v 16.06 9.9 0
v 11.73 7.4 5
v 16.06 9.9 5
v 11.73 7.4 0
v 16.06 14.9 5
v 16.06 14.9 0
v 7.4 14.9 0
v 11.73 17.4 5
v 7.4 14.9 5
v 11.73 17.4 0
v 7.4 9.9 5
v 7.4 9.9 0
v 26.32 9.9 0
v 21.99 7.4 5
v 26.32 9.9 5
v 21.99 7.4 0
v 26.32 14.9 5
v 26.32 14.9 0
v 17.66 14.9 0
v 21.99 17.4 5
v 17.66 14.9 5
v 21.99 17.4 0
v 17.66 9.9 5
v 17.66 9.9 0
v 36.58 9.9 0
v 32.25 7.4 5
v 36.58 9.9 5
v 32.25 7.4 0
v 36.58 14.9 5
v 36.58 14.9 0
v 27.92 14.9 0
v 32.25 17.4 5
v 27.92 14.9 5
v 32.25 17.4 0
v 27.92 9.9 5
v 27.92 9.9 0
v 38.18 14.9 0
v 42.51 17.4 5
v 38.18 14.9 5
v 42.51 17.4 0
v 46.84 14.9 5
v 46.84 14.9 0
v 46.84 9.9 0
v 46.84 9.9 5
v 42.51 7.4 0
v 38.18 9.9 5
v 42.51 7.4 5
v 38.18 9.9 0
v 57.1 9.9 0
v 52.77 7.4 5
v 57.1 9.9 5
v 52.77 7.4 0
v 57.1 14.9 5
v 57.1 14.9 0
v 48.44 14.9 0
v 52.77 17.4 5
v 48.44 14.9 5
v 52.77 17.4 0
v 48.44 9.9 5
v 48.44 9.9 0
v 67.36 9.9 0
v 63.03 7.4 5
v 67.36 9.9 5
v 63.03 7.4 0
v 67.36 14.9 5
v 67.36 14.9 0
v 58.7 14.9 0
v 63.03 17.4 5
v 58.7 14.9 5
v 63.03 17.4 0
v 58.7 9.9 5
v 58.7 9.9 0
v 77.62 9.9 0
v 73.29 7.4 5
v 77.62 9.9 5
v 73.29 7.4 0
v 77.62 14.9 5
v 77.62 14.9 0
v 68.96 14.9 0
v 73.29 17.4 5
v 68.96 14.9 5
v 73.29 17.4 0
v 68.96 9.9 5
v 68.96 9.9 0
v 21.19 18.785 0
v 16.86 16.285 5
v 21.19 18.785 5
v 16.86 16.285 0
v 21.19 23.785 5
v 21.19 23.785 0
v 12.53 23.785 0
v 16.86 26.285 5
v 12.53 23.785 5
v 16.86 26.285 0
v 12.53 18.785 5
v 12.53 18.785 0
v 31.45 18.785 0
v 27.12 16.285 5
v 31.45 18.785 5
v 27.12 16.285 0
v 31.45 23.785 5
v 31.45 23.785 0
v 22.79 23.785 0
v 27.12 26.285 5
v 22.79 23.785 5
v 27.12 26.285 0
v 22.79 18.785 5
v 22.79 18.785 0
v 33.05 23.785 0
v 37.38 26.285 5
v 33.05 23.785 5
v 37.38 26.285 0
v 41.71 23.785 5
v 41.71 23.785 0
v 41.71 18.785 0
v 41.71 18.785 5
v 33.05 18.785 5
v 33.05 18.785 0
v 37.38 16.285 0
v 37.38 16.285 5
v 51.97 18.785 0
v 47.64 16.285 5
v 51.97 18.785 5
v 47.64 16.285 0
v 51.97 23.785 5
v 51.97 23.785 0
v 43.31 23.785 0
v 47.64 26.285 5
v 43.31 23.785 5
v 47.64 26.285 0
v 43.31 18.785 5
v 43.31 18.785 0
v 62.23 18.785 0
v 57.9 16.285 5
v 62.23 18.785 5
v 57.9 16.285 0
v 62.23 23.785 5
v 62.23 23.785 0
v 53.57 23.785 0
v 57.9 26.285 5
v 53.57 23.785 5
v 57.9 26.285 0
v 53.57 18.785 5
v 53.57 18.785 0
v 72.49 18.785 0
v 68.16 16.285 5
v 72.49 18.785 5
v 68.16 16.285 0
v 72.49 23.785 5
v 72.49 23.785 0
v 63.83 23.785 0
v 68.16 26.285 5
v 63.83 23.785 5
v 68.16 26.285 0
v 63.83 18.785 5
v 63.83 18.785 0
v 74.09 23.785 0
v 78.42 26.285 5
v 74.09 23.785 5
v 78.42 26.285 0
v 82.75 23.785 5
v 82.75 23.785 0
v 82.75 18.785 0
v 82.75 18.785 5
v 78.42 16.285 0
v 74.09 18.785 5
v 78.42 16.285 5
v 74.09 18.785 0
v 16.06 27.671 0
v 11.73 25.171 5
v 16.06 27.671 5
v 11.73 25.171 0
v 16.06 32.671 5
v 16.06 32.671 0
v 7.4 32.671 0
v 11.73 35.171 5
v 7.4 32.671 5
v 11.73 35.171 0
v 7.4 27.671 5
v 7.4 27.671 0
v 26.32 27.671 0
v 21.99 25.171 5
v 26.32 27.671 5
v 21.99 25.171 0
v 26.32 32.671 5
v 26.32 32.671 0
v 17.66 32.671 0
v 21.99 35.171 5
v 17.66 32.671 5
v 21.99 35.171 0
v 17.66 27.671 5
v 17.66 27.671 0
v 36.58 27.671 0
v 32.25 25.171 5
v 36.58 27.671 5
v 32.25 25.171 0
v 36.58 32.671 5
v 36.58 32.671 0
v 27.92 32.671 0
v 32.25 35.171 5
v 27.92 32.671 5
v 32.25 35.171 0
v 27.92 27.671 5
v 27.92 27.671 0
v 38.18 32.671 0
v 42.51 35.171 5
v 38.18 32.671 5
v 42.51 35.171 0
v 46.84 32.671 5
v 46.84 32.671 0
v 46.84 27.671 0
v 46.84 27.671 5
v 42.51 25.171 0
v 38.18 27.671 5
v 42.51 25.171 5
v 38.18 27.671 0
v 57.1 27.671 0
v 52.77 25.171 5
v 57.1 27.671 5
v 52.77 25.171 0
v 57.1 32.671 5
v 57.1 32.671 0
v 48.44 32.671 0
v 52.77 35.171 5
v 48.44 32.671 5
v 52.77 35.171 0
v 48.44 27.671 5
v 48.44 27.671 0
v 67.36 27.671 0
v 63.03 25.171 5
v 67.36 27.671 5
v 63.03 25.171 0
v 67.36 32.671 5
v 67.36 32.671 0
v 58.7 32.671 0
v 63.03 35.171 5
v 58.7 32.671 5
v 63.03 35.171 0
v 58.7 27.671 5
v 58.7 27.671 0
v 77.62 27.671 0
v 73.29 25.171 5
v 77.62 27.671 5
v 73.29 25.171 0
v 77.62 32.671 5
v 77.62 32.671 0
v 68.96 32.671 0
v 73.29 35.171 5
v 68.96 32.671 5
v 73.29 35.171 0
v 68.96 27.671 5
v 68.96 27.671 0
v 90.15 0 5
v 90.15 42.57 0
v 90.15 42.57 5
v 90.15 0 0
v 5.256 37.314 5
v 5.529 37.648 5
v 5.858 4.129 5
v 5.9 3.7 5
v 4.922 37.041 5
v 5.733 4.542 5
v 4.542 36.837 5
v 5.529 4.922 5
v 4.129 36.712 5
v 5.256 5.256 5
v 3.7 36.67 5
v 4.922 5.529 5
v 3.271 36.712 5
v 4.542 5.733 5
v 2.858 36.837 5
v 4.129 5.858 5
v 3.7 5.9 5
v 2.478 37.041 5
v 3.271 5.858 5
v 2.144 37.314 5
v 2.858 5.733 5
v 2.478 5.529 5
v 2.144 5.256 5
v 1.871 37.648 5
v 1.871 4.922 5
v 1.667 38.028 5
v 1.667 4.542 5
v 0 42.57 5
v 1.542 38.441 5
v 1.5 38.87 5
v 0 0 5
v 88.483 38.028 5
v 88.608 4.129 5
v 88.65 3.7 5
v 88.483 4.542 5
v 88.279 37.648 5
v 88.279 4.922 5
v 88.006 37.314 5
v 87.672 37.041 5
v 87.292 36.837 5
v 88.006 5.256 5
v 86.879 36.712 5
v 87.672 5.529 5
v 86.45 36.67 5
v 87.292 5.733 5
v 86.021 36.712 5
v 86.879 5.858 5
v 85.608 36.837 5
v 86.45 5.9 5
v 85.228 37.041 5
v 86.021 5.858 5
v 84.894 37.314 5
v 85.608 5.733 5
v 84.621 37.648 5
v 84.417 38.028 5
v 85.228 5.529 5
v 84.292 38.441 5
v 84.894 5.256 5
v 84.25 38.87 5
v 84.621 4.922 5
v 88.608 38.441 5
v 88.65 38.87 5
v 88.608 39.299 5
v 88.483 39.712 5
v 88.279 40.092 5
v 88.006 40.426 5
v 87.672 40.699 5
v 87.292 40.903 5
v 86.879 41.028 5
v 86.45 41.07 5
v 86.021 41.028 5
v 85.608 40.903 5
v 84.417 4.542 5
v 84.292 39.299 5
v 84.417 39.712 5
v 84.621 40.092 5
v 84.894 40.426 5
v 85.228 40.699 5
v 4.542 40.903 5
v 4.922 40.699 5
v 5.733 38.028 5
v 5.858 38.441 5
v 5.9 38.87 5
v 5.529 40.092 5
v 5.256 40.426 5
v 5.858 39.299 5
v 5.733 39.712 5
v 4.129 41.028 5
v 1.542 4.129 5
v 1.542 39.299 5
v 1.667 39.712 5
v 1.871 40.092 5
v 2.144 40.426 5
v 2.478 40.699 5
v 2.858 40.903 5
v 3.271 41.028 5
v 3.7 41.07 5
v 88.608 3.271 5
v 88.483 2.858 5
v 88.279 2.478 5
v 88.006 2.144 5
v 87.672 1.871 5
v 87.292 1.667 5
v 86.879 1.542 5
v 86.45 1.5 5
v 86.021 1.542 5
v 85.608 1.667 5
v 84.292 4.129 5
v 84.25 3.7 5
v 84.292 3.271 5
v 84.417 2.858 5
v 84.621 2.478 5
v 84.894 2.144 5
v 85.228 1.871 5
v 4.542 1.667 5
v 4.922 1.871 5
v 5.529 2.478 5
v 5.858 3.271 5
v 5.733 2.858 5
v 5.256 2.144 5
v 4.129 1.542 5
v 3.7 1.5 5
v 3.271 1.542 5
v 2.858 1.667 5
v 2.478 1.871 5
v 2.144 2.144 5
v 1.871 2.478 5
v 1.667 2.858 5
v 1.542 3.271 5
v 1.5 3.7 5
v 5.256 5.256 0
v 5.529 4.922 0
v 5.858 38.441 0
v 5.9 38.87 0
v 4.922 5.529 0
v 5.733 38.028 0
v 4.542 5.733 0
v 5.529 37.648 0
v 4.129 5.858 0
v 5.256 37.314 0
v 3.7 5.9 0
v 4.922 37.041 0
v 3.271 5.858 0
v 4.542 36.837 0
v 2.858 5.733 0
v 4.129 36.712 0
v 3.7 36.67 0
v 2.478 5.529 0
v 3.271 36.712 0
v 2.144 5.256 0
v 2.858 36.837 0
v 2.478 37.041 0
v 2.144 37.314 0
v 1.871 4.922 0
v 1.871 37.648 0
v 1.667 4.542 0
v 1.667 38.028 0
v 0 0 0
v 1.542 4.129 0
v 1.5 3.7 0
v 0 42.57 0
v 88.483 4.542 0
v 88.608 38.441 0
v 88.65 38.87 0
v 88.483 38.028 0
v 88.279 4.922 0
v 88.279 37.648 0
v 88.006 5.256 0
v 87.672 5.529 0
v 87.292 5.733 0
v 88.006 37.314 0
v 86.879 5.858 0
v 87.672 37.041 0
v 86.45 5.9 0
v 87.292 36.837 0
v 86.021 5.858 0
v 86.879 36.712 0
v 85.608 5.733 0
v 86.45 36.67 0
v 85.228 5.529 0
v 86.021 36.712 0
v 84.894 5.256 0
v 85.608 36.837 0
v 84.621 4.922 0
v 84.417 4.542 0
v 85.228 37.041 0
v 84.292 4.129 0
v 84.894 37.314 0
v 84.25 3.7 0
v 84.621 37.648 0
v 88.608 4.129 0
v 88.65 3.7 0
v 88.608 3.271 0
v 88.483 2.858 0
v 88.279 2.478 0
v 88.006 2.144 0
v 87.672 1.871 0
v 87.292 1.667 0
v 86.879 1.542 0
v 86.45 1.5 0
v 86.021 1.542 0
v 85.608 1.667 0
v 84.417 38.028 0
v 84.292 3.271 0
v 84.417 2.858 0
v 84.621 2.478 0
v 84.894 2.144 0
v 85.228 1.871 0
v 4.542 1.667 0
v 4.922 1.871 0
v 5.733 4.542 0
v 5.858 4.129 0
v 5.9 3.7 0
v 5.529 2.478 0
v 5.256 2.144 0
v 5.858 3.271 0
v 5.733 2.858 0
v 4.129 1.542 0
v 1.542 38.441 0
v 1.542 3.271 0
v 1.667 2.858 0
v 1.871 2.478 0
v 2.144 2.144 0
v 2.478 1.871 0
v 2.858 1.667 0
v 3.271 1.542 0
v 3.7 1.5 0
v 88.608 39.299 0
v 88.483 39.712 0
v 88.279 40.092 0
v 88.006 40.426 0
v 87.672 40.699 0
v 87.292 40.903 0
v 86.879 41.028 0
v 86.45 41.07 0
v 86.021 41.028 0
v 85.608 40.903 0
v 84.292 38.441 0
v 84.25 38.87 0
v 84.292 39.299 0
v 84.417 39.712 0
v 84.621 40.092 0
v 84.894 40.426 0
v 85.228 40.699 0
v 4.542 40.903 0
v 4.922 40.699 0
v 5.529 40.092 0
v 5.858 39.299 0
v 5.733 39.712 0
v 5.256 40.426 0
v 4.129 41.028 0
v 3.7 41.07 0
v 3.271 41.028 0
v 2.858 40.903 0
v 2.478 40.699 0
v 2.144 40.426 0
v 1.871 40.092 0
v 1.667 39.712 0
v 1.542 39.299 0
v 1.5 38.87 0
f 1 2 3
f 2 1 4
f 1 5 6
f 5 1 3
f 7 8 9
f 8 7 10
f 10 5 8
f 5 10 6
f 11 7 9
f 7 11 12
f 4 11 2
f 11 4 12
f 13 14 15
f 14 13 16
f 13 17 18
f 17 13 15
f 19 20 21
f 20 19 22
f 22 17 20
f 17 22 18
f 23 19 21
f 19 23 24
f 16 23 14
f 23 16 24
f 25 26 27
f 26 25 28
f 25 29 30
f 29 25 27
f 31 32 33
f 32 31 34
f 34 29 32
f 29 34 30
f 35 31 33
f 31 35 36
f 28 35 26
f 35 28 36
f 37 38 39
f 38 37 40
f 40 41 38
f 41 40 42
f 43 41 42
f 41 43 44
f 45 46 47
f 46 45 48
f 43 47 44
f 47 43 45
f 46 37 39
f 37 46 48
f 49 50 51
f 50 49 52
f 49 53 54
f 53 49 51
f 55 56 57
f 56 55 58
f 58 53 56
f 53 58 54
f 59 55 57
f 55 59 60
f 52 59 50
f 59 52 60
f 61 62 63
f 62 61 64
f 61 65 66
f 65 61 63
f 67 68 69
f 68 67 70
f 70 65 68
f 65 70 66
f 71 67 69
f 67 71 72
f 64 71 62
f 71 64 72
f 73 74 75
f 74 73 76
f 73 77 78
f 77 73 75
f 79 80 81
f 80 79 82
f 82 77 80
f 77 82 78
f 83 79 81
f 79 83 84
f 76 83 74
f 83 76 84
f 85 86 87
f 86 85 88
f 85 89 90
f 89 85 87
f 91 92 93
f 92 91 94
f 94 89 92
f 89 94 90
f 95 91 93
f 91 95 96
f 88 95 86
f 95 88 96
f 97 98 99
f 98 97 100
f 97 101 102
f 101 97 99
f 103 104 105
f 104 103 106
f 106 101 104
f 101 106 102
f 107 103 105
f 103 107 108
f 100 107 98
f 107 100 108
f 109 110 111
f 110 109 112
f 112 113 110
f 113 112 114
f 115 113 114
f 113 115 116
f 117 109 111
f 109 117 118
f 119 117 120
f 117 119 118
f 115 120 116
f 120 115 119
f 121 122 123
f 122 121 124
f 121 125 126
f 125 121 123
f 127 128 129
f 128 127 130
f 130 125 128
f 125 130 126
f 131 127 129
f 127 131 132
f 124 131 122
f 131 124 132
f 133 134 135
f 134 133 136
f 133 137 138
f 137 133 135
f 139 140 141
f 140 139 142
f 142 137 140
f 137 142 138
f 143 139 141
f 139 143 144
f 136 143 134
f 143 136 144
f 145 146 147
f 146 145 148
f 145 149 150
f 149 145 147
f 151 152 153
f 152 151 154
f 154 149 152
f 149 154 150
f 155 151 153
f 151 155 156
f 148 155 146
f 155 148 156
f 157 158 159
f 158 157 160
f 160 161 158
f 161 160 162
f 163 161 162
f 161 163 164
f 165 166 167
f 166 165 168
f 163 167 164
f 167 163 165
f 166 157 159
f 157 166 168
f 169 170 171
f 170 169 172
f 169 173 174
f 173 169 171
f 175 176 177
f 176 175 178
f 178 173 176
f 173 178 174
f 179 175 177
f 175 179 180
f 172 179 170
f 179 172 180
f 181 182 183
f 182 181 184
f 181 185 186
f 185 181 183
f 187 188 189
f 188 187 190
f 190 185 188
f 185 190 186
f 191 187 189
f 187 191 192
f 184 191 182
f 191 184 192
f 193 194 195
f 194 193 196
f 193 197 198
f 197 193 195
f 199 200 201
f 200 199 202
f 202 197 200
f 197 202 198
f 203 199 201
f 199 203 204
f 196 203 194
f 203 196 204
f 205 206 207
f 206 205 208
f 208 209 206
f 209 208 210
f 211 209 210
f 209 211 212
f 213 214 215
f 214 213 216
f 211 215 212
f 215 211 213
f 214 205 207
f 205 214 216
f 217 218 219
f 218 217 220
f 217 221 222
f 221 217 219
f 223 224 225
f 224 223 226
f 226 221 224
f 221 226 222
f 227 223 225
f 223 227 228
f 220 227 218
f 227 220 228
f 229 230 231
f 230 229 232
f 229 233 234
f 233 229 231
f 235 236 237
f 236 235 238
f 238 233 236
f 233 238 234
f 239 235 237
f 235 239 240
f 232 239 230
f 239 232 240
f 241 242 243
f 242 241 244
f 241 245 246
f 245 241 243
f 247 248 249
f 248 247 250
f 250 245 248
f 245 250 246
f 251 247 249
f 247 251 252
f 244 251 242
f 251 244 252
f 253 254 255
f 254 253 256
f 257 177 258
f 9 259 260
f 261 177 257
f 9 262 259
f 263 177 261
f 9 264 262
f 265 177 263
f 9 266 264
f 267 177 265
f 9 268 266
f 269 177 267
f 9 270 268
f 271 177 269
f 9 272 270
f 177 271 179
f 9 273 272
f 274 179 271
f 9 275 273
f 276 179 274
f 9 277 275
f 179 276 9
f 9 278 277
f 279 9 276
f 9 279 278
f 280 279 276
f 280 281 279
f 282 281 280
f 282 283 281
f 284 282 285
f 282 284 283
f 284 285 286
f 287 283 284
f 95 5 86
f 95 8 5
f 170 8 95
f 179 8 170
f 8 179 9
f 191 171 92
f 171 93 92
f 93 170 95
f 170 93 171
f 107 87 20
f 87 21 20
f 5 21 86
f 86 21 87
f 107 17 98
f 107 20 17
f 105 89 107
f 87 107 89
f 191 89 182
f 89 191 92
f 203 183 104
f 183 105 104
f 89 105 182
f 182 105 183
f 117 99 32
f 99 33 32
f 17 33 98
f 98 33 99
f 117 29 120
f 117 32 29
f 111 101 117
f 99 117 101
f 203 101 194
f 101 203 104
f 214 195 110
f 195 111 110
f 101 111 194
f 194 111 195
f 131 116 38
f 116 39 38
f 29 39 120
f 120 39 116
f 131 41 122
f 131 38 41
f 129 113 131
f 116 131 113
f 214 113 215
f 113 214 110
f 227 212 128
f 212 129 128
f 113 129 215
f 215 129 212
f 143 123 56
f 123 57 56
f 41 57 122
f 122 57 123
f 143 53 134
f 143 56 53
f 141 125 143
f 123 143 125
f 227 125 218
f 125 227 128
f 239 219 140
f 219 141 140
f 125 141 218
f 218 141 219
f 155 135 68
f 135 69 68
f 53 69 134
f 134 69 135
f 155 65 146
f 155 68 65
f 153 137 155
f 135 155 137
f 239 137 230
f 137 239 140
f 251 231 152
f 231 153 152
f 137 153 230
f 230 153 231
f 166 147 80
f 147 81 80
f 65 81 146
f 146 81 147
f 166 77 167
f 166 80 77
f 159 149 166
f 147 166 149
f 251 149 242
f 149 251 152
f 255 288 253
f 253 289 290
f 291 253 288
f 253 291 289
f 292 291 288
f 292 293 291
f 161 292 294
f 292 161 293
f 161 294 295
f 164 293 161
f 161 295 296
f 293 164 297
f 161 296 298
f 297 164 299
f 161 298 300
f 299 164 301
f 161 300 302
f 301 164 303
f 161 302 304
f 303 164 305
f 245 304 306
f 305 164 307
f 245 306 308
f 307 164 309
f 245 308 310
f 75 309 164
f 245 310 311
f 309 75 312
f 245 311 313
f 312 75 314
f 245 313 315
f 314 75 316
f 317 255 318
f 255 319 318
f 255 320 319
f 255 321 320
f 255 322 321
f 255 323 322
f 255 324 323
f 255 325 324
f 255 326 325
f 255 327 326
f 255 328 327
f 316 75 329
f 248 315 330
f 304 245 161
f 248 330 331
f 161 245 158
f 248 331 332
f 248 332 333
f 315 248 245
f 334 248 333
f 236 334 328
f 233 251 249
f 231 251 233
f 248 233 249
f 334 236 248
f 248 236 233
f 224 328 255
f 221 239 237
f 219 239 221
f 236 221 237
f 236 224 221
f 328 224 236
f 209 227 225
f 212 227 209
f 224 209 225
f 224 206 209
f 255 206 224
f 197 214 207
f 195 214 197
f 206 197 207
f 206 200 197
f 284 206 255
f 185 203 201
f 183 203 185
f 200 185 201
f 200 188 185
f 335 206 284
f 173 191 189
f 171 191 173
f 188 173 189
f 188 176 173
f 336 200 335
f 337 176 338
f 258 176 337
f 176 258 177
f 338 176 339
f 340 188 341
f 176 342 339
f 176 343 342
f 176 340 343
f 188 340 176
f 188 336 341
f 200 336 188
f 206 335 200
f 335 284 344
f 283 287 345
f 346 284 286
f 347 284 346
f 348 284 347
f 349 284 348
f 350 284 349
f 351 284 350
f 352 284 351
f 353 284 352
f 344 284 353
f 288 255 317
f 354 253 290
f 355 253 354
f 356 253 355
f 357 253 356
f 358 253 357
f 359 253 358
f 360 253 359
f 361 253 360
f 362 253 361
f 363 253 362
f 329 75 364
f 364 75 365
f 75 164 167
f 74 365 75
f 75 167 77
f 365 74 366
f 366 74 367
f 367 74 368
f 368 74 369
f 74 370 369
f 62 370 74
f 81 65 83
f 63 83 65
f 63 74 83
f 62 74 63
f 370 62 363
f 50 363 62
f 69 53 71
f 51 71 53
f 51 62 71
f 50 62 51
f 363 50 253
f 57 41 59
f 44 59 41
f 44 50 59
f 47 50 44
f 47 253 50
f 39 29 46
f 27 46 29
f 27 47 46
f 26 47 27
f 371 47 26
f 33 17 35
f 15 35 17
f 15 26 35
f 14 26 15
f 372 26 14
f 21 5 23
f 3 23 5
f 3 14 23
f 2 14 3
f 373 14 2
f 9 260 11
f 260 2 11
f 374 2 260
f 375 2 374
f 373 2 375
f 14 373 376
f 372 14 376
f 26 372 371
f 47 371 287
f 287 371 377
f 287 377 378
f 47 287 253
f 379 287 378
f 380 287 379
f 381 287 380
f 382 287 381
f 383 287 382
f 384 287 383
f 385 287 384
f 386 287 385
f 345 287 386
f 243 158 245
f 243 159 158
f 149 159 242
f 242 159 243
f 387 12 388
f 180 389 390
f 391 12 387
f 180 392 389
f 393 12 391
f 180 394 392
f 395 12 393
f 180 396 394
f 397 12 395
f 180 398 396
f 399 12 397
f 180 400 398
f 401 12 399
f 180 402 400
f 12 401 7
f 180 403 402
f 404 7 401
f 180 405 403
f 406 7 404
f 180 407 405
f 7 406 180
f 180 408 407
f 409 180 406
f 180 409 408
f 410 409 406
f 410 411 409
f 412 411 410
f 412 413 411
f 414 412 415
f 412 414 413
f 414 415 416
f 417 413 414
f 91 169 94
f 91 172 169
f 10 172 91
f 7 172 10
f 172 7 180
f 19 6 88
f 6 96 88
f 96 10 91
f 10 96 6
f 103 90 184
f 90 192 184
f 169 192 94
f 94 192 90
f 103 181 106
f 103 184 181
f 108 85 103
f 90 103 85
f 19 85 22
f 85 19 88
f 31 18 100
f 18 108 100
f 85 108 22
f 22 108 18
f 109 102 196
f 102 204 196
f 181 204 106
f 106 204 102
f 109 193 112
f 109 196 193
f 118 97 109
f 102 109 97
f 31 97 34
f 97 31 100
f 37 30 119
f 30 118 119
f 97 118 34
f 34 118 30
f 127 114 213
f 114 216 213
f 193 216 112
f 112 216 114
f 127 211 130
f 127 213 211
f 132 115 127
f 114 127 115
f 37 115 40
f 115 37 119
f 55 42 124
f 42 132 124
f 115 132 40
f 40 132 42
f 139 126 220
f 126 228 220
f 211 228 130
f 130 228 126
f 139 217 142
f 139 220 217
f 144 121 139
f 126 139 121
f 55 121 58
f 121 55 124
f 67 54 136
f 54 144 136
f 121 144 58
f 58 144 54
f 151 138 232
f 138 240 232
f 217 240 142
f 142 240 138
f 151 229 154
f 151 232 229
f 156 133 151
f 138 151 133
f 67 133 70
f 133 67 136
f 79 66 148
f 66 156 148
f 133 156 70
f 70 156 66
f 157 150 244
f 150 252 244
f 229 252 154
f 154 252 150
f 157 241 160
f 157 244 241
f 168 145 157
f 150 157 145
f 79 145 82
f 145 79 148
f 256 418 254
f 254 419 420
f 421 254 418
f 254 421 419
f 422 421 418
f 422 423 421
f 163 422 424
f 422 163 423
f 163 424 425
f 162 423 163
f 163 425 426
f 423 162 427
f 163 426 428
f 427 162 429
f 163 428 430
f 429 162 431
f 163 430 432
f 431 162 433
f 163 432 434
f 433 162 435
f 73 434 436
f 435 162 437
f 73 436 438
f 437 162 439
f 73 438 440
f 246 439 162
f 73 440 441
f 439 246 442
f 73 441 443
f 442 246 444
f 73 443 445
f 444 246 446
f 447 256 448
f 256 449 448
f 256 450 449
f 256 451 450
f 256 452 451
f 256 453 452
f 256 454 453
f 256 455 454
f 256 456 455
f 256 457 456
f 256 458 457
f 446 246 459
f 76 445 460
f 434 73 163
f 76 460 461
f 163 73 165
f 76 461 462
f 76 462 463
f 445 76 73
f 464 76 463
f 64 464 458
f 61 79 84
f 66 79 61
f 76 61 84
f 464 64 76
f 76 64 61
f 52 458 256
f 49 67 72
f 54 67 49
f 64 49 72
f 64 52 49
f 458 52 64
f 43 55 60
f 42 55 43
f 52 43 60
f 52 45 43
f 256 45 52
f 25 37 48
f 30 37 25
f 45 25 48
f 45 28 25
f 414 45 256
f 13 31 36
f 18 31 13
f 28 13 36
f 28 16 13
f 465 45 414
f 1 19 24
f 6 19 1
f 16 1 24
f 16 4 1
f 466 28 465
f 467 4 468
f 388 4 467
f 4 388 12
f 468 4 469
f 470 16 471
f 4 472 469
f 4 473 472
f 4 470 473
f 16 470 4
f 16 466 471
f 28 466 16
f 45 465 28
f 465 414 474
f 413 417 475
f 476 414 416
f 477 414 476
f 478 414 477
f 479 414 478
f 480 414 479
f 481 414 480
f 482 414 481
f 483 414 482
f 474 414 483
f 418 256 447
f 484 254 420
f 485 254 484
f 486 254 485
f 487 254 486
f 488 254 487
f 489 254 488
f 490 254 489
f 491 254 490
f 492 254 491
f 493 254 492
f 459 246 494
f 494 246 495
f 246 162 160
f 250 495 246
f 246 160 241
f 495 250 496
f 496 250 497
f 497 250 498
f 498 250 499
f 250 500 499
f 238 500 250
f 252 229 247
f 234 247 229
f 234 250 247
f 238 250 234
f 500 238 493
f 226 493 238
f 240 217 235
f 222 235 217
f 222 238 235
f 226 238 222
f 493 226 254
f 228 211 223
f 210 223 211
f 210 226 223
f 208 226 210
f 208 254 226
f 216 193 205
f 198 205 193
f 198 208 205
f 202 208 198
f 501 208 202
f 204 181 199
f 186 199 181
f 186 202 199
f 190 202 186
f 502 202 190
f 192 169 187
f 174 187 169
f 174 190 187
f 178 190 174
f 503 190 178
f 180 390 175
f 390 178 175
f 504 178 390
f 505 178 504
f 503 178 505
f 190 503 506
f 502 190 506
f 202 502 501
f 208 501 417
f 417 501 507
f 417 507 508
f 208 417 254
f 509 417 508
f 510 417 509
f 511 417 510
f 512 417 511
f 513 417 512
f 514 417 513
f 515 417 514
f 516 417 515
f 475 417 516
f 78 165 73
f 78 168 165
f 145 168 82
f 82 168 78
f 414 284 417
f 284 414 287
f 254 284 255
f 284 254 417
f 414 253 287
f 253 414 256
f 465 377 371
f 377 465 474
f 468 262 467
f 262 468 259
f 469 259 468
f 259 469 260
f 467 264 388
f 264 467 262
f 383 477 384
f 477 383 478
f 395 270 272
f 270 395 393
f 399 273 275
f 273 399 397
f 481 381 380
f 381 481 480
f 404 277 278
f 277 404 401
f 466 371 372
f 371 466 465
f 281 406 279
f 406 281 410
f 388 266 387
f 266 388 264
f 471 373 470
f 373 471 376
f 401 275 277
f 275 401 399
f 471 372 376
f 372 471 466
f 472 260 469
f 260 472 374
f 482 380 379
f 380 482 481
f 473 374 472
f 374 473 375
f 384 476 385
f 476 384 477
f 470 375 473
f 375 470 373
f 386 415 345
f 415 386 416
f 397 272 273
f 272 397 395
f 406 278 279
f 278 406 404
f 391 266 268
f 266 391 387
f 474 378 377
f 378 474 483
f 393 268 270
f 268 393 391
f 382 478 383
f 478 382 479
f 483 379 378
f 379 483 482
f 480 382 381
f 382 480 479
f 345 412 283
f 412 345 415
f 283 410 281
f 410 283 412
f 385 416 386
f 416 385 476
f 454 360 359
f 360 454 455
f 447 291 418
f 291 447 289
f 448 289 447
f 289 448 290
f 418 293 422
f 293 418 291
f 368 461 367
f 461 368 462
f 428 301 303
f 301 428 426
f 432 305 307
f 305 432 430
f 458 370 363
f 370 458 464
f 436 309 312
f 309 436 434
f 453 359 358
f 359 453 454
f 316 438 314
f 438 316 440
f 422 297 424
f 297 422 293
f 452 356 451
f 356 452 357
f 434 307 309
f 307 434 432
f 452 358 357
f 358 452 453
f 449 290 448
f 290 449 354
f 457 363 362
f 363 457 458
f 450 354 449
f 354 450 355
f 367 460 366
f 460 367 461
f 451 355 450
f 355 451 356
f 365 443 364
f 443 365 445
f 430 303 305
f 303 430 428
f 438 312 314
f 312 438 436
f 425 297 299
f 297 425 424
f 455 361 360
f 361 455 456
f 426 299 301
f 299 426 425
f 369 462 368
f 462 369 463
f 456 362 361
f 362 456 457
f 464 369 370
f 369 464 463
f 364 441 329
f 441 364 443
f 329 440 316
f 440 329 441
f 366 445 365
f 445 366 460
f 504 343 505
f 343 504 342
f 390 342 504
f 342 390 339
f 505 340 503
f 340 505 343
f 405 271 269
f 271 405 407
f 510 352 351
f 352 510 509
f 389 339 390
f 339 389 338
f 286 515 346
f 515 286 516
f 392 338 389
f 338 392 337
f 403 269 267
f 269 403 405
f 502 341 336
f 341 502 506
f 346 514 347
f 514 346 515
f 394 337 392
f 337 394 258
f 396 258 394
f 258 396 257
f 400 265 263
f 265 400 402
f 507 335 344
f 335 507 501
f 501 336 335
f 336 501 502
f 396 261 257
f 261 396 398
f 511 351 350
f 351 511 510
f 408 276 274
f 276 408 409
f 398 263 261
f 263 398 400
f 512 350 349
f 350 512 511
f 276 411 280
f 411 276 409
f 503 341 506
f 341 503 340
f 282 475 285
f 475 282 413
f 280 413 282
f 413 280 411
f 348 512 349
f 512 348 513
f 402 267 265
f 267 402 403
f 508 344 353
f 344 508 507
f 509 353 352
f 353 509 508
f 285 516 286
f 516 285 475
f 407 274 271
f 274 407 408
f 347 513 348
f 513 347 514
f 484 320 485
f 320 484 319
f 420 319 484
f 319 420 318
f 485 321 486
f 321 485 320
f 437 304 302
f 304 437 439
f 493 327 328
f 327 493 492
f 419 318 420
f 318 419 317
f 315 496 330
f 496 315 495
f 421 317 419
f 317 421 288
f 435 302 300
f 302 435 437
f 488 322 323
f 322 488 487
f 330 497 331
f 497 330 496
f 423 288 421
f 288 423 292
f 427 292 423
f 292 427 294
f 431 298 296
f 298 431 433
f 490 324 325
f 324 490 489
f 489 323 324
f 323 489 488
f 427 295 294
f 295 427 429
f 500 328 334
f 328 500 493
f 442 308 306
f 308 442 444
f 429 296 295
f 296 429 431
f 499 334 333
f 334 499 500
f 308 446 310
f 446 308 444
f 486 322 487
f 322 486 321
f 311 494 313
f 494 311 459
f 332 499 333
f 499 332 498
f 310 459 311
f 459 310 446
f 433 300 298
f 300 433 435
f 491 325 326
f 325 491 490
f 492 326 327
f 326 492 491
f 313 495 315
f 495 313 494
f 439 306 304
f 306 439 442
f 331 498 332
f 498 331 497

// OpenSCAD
$fn = 32;

// ----------------------------------------------------------------------
// Honeycomb panel: 90.15 x 42.57 mm, 21 cells of 10 mm
// ----------------------------------------------------------------------

// --- parameters (mm) ---
panel_w = 90.15;          // panel width
panel_d = 42.57;          // panel depth
thick = 5;                // panel thickness
cell_r = 5;               // hex cell circumradius
pitch = 10.26;            // hex cell pitch (centre to centre)
web = 1.6;                // web between the cells
columns = 7;              // columns of cells
rows = 3;                 // rows of cells
cell_count = 21;          // total cells
shift_x = 11.73;          // first cell offset in x
shift_y = 12.4;           // first cell offset in y
mount_d = 4.4;            // corner mounting holes
hole_off = 3.7;           // mounting hole offset from the corners

difference() {
  union() {
    cube([panel_w, panel_d, thick]);
  }
  /* hexagonal cells, point-up, cut right through the plate */
  for (row = [0 : rows - 1]) {
    for (col = [0 : columns - 1]) {
      translate([shift_x + col * pitch + (row % 2) * pitch / 2, shift_y + row * pitch * 0.866025, -2.5]) rotate([0, 0, 30]) cylinder(h = thick + 5, d = 2 * cell_r, $fn = 6);
    }
  }
  /* corner mounting holes, clear of the outer cell web */
  translate([3.7, 3.7, -2.5]) cylinder(h = thick + 5, d = mount_d);
  translate([86.45, 3.7, -2.5]) cylinder(h = thick + 5, d = mount_d);
  translate([3.7, 38.87, -2.5]) cylinder(h = thick + 5, d = mount_d);
  translate([86.45, 38.87, -2.5]) cylinder(h = thick + 5, d = mount_d);
}
